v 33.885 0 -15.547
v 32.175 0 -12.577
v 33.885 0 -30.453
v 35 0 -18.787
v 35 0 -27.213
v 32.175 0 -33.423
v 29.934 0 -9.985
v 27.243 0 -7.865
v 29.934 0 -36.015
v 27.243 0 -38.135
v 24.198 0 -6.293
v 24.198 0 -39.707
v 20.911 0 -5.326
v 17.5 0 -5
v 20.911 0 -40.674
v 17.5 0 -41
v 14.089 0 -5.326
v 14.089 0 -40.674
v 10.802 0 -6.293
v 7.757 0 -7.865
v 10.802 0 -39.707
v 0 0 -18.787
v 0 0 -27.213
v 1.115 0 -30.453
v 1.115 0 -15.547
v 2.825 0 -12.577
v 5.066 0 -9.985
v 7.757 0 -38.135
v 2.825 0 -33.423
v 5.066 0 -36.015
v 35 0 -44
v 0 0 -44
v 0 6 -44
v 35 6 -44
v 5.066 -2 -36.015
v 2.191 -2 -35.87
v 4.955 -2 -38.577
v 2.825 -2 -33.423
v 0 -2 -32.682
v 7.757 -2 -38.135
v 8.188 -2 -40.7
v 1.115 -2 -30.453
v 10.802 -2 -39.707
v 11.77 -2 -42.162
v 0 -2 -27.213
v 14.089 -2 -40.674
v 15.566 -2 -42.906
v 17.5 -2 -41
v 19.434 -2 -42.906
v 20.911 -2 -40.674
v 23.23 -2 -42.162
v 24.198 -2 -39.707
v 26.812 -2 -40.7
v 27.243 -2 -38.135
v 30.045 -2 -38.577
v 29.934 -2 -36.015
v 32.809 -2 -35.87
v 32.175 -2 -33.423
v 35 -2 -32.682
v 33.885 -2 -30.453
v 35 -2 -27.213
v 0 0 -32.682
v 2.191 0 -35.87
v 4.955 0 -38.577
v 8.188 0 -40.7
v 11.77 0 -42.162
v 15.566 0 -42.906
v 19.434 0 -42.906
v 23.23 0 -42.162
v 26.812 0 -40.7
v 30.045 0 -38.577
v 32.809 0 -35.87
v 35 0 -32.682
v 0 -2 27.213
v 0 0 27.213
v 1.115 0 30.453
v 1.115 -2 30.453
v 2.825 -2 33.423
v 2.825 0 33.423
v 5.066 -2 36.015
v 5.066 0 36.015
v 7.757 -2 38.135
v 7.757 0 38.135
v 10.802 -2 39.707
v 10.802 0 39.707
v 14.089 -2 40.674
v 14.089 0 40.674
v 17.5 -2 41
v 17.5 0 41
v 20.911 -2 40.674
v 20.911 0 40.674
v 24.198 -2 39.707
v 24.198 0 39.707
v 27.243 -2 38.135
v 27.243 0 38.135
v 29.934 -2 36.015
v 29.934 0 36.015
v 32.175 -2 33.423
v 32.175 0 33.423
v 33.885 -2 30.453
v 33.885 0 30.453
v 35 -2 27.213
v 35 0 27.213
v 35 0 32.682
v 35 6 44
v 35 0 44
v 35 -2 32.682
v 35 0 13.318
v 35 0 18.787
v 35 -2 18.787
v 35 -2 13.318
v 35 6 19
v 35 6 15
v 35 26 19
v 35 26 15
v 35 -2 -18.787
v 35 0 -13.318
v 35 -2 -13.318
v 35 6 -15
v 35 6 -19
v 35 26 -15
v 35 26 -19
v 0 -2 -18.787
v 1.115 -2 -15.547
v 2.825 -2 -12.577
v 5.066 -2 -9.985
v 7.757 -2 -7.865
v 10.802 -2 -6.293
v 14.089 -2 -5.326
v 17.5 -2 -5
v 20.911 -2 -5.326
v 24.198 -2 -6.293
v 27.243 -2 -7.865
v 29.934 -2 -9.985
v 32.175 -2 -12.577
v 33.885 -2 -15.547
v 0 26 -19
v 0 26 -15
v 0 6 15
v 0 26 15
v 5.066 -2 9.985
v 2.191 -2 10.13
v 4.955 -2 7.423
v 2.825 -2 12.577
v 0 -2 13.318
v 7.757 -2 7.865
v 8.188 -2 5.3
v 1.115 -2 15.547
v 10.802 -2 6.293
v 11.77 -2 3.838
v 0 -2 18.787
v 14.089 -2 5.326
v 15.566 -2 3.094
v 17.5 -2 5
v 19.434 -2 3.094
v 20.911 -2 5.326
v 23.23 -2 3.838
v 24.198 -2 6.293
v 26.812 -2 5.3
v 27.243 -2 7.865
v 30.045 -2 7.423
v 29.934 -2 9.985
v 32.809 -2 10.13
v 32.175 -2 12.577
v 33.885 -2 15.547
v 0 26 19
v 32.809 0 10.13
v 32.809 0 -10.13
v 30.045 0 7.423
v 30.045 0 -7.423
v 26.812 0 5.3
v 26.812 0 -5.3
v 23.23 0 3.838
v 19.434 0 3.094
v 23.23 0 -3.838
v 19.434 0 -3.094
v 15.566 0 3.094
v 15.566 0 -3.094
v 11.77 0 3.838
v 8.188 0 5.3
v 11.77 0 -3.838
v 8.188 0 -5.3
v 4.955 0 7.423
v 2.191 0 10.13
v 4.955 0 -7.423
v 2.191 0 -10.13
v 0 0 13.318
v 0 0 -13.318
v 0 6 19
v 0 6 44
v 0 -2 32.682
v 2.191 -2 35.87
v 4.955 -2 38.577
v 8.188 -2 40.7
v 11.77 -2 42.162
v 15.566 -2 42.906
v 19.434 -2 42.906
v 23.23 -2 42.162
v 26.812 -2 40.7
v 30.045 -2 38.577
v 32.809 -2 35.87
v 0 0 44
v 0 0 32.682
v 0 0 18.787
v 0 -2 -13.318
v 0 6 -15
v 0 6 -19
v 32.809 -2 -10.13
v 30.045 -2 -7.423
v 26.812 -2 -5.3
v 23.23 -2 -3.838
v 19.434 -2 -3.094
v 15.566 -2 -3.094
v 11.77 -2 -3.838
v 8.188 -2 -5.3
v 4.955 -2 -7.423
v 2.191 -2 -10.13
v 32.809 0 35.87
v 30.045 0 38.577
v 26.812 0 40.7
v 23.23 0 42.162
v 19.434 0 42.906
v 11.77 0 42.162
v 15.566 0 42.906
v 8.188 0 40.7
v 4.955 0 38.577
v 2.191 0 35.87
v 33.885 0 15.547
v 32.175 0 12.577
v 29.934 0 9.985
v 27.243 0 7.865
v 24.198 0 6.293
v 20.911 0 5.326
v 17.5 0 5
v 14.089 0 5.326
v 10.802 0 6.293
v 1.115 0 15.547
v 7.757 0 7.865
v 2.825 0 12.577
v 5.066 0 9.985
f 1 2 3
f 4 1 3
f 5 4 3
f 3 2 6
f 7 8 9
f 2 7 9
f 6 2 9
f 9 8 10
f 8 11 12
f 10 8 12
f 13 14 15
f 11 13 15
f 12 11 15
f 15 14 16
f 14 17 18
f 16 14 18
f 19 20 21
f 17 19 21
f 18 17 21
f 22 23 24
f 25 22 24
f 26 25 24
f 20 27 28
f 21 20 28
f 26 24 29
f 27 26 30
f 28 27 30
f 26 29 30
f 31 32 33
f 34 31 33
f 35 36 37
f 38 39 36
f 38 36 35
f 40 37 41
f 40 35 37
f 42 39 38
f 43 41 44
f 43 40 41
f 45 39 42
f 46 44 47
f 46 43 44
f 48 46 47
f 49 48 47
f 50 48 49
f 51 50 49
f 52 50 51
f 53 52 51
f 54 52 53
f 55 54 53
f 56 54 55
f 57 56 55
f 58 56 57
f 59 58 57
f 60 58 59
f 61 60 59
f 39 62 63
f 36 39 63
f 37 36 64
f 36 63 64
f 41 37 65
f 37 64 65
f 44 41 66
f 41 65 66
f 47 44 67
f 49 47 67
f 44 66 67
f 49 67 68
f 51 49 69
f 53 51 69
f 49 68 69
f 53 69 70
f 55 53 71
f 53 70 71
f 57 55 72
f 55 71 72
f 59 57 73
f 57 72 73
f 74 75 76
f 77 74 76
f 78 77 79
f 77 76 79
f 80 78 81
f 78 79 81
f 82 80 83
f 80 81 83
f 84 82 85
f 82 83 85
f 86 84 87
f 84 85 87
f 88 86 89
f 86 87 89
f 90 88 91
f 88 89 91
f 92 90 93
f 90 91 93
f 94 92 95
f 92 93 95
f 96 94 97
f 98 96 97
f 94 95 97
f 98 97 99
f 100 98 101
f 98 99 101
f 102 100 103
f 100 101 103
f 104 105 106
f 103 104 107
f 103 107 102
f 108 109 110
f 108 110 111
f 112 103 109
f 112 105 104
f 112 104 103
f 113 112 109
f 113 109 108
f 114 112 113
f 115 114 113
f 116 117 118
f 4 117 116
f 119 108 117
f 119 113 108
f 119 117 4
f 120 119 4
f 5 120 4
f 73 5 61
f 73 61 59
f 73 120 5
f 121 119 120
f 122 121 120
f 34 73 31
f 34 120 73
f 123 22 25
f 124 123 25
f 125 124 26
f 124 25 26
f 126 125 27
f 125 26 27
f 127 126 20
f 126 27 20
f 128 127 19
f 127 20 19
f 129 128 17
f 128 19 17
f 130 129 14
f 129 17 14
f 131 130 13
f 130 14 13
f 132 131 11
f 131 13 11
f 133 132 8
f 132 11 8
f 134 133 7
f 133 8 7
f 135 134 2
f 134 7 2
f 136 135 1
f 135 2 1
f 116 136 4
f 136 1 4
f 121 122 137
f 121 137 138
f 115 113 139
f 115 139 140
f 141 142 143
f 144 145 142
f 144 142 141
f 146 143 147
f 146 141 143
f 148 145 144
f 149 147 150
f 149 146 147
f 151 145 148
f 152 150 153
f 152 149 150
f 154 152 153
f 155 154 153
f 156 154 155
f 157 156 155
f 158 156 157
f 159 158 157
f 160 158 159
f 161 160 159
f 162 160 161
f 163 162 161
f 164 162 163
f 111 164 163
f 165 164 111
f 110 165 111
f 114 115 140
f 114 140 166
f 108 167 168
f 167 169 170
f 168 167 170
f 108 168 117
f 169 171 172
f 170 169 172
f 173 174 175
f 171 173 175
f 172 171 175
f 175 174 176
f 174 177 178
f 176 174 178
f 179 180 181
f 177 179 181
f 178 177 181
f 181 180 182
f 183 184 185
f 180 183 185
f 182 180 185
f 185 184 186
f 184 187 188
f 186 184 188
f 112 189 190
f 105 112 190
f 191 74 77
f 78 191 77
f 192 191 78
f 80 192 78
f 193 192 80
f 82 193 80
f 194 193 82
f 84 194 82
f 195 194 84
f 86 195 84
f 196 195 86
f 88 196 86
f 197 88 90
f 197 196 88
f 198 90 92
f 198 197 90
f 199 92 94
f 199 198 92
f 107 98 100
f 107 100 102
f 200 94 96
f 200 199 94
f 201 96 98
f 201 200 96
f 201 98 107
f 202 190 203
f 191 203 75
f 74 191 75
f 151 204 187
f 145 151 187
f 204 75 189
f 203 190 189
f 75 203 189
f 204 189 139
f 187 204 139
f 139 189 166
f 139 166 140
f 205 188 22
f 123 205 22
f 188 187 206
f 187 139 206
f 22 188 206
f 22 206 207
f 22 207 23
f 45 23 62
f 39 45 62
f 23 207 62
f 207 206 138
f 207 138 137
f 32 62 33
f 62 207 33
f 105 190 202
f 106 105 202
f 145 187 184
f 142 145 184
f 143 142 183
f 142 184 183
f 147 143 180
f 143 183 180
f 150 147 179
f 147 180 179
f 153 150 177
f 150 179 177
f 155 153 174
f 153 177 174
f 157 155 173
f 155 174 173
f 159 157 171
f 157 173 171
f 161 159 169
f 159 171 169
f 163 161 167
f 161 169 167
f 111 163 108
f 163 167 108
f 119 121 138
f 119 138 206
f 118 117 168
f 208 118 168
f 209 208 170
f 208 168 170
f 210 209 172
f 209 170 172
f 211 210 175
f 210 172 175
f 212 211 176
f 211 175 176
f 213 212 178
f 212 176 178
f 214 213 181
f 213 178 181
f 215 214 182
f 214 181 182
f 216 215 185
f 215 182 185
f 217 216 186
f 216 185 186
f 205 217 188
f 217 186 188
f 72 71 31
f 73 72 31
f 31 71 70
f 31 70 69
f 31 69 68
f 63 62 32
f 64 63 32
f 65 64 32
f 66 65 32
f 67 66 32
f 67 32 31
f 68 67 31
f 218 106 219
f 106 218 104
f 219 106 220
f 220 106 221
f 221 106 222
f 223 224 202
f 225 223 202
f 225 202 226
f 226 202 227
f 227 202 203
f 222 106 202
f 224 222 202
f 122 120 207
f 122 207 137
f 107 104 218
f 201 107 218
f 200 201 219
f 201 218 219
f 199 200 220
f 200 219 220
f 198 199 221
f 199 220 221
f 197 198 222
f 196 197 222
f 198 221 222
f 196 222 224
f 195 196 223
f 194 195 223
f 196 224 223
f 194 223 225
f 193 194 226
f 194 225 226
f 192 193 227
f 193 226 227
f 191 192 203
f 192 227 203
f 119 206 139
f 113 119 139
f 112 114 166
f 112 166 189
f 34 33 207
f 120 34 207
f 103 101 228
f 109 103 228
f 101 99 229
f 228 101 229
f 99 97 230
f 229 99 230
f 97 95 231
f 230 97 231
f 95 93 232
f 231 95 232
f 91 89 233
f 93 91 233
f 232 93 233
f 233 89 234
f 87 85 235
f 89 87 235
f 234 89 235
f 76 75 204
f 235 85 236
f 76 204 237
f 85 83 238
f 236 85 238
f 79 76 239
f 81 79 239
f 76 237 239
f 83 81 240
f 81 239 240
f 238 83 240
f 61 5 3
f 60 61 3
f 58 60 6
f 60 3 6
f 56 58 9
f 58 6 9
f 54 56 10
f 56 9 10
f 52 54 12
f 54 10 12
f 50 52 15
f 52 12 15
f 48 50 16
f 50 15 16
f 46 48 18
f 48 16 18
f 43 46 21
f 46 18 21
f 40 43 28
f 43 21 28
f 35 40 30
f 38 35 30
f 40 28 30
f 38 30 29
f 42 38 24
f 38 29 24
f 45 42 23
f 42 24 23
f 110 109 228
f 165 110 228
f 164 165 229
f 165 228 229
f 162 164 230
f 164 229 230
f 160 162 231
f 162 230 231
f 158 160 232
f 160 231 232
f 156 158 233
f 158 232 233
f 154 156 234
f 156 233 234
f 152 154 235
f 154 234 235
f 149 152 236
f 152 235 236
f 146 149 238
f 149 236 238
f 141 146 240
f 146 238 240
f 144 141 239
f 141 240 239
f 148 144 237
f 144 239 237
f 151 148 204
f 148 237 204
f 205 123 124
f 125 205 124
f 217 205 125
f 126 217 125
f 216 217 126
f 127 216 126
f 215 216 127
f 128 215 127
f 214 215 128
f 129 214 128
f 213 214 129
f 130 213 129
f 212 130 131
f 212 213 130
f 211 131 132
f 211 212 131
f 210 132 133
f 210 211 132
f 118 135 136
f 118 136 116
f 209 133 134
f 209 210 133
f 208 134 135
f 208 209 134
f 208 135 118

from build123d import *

# Parameters (mm, degrees)
EXTRUDE_1_DEPTH = 35
EXTRUDE_2_DEPTH = 2


with BuildPart() as part:
    # 草图1 → 凸台-拉伸1 (new body)
    with BuildSketch(Plane(origin=(0, 0, 0), x_dir=(0, 0, -1), z_dir=(1, 0, 0))):
        Polygon((-44, 0), (44, 0), (44, 6), (19, 6), (19, 26), (15, 26), (15, 6), (-15, 6), (-15, 26), (-19, 26), (-19, 6), (-44, 6), align=None)
    extrude(amount=EXTRUDE_1_DEPTH)

    # 草图2 → 凸台-拉伸2 (add)
    with BuildSketch(Plane.XZ):
        with BuildLine():
            Line((35, 27.213074887), (35, 32.682458366))
            ThreePointArc((35, 32.682458366), (17.5, 43), (0, 32.682458366))
            Line((0, 32.682458366), (0, 27.213074887))
            ThreePointArc((0, 27.213074887), (17.5, 41), (35, 27.213074887))
        make_face()
        with BuildLine():
            Line((35, 13.317541634), (35, 18.786925113))
            ThreePointArc((35, 18.786925113), (17.5, 5), (0, 18.786925113))
            Line((0, 18.786925113), (0, 13.317541634))
            ThreePointArc((0, 13.317541634), (17.5, 3), (35, 13.317541634))
        make_face()
        with BuildLine():
            Line((35, -18.786925113), (35, -13.317541634))
            ThreePointArc((35, -13.317541634), (17.5, -3), (0, -13.317541634))
            Line((0, -13.317541634), (0, -18.786925113))
            ThreePointArc((0, -18.786925113), (17.5, -5), (35, -18.786925113))
        make_face()
        with BuildLine():
            Line((0, -27.213074887), (0, -32.682458366))
            ThreePointArc((0, -32.682458366), (17.5, -43), (35, -32.682458366))
            Line((35, -32.682458366), (35, -27.213074887))
            ThreePointArc((35, -27.213074887), (17.5, -41), (0, -27.213074887))
        make_face()
    extrude(amount=EXTRUDE_2_DEPTH)


solid = part.part
